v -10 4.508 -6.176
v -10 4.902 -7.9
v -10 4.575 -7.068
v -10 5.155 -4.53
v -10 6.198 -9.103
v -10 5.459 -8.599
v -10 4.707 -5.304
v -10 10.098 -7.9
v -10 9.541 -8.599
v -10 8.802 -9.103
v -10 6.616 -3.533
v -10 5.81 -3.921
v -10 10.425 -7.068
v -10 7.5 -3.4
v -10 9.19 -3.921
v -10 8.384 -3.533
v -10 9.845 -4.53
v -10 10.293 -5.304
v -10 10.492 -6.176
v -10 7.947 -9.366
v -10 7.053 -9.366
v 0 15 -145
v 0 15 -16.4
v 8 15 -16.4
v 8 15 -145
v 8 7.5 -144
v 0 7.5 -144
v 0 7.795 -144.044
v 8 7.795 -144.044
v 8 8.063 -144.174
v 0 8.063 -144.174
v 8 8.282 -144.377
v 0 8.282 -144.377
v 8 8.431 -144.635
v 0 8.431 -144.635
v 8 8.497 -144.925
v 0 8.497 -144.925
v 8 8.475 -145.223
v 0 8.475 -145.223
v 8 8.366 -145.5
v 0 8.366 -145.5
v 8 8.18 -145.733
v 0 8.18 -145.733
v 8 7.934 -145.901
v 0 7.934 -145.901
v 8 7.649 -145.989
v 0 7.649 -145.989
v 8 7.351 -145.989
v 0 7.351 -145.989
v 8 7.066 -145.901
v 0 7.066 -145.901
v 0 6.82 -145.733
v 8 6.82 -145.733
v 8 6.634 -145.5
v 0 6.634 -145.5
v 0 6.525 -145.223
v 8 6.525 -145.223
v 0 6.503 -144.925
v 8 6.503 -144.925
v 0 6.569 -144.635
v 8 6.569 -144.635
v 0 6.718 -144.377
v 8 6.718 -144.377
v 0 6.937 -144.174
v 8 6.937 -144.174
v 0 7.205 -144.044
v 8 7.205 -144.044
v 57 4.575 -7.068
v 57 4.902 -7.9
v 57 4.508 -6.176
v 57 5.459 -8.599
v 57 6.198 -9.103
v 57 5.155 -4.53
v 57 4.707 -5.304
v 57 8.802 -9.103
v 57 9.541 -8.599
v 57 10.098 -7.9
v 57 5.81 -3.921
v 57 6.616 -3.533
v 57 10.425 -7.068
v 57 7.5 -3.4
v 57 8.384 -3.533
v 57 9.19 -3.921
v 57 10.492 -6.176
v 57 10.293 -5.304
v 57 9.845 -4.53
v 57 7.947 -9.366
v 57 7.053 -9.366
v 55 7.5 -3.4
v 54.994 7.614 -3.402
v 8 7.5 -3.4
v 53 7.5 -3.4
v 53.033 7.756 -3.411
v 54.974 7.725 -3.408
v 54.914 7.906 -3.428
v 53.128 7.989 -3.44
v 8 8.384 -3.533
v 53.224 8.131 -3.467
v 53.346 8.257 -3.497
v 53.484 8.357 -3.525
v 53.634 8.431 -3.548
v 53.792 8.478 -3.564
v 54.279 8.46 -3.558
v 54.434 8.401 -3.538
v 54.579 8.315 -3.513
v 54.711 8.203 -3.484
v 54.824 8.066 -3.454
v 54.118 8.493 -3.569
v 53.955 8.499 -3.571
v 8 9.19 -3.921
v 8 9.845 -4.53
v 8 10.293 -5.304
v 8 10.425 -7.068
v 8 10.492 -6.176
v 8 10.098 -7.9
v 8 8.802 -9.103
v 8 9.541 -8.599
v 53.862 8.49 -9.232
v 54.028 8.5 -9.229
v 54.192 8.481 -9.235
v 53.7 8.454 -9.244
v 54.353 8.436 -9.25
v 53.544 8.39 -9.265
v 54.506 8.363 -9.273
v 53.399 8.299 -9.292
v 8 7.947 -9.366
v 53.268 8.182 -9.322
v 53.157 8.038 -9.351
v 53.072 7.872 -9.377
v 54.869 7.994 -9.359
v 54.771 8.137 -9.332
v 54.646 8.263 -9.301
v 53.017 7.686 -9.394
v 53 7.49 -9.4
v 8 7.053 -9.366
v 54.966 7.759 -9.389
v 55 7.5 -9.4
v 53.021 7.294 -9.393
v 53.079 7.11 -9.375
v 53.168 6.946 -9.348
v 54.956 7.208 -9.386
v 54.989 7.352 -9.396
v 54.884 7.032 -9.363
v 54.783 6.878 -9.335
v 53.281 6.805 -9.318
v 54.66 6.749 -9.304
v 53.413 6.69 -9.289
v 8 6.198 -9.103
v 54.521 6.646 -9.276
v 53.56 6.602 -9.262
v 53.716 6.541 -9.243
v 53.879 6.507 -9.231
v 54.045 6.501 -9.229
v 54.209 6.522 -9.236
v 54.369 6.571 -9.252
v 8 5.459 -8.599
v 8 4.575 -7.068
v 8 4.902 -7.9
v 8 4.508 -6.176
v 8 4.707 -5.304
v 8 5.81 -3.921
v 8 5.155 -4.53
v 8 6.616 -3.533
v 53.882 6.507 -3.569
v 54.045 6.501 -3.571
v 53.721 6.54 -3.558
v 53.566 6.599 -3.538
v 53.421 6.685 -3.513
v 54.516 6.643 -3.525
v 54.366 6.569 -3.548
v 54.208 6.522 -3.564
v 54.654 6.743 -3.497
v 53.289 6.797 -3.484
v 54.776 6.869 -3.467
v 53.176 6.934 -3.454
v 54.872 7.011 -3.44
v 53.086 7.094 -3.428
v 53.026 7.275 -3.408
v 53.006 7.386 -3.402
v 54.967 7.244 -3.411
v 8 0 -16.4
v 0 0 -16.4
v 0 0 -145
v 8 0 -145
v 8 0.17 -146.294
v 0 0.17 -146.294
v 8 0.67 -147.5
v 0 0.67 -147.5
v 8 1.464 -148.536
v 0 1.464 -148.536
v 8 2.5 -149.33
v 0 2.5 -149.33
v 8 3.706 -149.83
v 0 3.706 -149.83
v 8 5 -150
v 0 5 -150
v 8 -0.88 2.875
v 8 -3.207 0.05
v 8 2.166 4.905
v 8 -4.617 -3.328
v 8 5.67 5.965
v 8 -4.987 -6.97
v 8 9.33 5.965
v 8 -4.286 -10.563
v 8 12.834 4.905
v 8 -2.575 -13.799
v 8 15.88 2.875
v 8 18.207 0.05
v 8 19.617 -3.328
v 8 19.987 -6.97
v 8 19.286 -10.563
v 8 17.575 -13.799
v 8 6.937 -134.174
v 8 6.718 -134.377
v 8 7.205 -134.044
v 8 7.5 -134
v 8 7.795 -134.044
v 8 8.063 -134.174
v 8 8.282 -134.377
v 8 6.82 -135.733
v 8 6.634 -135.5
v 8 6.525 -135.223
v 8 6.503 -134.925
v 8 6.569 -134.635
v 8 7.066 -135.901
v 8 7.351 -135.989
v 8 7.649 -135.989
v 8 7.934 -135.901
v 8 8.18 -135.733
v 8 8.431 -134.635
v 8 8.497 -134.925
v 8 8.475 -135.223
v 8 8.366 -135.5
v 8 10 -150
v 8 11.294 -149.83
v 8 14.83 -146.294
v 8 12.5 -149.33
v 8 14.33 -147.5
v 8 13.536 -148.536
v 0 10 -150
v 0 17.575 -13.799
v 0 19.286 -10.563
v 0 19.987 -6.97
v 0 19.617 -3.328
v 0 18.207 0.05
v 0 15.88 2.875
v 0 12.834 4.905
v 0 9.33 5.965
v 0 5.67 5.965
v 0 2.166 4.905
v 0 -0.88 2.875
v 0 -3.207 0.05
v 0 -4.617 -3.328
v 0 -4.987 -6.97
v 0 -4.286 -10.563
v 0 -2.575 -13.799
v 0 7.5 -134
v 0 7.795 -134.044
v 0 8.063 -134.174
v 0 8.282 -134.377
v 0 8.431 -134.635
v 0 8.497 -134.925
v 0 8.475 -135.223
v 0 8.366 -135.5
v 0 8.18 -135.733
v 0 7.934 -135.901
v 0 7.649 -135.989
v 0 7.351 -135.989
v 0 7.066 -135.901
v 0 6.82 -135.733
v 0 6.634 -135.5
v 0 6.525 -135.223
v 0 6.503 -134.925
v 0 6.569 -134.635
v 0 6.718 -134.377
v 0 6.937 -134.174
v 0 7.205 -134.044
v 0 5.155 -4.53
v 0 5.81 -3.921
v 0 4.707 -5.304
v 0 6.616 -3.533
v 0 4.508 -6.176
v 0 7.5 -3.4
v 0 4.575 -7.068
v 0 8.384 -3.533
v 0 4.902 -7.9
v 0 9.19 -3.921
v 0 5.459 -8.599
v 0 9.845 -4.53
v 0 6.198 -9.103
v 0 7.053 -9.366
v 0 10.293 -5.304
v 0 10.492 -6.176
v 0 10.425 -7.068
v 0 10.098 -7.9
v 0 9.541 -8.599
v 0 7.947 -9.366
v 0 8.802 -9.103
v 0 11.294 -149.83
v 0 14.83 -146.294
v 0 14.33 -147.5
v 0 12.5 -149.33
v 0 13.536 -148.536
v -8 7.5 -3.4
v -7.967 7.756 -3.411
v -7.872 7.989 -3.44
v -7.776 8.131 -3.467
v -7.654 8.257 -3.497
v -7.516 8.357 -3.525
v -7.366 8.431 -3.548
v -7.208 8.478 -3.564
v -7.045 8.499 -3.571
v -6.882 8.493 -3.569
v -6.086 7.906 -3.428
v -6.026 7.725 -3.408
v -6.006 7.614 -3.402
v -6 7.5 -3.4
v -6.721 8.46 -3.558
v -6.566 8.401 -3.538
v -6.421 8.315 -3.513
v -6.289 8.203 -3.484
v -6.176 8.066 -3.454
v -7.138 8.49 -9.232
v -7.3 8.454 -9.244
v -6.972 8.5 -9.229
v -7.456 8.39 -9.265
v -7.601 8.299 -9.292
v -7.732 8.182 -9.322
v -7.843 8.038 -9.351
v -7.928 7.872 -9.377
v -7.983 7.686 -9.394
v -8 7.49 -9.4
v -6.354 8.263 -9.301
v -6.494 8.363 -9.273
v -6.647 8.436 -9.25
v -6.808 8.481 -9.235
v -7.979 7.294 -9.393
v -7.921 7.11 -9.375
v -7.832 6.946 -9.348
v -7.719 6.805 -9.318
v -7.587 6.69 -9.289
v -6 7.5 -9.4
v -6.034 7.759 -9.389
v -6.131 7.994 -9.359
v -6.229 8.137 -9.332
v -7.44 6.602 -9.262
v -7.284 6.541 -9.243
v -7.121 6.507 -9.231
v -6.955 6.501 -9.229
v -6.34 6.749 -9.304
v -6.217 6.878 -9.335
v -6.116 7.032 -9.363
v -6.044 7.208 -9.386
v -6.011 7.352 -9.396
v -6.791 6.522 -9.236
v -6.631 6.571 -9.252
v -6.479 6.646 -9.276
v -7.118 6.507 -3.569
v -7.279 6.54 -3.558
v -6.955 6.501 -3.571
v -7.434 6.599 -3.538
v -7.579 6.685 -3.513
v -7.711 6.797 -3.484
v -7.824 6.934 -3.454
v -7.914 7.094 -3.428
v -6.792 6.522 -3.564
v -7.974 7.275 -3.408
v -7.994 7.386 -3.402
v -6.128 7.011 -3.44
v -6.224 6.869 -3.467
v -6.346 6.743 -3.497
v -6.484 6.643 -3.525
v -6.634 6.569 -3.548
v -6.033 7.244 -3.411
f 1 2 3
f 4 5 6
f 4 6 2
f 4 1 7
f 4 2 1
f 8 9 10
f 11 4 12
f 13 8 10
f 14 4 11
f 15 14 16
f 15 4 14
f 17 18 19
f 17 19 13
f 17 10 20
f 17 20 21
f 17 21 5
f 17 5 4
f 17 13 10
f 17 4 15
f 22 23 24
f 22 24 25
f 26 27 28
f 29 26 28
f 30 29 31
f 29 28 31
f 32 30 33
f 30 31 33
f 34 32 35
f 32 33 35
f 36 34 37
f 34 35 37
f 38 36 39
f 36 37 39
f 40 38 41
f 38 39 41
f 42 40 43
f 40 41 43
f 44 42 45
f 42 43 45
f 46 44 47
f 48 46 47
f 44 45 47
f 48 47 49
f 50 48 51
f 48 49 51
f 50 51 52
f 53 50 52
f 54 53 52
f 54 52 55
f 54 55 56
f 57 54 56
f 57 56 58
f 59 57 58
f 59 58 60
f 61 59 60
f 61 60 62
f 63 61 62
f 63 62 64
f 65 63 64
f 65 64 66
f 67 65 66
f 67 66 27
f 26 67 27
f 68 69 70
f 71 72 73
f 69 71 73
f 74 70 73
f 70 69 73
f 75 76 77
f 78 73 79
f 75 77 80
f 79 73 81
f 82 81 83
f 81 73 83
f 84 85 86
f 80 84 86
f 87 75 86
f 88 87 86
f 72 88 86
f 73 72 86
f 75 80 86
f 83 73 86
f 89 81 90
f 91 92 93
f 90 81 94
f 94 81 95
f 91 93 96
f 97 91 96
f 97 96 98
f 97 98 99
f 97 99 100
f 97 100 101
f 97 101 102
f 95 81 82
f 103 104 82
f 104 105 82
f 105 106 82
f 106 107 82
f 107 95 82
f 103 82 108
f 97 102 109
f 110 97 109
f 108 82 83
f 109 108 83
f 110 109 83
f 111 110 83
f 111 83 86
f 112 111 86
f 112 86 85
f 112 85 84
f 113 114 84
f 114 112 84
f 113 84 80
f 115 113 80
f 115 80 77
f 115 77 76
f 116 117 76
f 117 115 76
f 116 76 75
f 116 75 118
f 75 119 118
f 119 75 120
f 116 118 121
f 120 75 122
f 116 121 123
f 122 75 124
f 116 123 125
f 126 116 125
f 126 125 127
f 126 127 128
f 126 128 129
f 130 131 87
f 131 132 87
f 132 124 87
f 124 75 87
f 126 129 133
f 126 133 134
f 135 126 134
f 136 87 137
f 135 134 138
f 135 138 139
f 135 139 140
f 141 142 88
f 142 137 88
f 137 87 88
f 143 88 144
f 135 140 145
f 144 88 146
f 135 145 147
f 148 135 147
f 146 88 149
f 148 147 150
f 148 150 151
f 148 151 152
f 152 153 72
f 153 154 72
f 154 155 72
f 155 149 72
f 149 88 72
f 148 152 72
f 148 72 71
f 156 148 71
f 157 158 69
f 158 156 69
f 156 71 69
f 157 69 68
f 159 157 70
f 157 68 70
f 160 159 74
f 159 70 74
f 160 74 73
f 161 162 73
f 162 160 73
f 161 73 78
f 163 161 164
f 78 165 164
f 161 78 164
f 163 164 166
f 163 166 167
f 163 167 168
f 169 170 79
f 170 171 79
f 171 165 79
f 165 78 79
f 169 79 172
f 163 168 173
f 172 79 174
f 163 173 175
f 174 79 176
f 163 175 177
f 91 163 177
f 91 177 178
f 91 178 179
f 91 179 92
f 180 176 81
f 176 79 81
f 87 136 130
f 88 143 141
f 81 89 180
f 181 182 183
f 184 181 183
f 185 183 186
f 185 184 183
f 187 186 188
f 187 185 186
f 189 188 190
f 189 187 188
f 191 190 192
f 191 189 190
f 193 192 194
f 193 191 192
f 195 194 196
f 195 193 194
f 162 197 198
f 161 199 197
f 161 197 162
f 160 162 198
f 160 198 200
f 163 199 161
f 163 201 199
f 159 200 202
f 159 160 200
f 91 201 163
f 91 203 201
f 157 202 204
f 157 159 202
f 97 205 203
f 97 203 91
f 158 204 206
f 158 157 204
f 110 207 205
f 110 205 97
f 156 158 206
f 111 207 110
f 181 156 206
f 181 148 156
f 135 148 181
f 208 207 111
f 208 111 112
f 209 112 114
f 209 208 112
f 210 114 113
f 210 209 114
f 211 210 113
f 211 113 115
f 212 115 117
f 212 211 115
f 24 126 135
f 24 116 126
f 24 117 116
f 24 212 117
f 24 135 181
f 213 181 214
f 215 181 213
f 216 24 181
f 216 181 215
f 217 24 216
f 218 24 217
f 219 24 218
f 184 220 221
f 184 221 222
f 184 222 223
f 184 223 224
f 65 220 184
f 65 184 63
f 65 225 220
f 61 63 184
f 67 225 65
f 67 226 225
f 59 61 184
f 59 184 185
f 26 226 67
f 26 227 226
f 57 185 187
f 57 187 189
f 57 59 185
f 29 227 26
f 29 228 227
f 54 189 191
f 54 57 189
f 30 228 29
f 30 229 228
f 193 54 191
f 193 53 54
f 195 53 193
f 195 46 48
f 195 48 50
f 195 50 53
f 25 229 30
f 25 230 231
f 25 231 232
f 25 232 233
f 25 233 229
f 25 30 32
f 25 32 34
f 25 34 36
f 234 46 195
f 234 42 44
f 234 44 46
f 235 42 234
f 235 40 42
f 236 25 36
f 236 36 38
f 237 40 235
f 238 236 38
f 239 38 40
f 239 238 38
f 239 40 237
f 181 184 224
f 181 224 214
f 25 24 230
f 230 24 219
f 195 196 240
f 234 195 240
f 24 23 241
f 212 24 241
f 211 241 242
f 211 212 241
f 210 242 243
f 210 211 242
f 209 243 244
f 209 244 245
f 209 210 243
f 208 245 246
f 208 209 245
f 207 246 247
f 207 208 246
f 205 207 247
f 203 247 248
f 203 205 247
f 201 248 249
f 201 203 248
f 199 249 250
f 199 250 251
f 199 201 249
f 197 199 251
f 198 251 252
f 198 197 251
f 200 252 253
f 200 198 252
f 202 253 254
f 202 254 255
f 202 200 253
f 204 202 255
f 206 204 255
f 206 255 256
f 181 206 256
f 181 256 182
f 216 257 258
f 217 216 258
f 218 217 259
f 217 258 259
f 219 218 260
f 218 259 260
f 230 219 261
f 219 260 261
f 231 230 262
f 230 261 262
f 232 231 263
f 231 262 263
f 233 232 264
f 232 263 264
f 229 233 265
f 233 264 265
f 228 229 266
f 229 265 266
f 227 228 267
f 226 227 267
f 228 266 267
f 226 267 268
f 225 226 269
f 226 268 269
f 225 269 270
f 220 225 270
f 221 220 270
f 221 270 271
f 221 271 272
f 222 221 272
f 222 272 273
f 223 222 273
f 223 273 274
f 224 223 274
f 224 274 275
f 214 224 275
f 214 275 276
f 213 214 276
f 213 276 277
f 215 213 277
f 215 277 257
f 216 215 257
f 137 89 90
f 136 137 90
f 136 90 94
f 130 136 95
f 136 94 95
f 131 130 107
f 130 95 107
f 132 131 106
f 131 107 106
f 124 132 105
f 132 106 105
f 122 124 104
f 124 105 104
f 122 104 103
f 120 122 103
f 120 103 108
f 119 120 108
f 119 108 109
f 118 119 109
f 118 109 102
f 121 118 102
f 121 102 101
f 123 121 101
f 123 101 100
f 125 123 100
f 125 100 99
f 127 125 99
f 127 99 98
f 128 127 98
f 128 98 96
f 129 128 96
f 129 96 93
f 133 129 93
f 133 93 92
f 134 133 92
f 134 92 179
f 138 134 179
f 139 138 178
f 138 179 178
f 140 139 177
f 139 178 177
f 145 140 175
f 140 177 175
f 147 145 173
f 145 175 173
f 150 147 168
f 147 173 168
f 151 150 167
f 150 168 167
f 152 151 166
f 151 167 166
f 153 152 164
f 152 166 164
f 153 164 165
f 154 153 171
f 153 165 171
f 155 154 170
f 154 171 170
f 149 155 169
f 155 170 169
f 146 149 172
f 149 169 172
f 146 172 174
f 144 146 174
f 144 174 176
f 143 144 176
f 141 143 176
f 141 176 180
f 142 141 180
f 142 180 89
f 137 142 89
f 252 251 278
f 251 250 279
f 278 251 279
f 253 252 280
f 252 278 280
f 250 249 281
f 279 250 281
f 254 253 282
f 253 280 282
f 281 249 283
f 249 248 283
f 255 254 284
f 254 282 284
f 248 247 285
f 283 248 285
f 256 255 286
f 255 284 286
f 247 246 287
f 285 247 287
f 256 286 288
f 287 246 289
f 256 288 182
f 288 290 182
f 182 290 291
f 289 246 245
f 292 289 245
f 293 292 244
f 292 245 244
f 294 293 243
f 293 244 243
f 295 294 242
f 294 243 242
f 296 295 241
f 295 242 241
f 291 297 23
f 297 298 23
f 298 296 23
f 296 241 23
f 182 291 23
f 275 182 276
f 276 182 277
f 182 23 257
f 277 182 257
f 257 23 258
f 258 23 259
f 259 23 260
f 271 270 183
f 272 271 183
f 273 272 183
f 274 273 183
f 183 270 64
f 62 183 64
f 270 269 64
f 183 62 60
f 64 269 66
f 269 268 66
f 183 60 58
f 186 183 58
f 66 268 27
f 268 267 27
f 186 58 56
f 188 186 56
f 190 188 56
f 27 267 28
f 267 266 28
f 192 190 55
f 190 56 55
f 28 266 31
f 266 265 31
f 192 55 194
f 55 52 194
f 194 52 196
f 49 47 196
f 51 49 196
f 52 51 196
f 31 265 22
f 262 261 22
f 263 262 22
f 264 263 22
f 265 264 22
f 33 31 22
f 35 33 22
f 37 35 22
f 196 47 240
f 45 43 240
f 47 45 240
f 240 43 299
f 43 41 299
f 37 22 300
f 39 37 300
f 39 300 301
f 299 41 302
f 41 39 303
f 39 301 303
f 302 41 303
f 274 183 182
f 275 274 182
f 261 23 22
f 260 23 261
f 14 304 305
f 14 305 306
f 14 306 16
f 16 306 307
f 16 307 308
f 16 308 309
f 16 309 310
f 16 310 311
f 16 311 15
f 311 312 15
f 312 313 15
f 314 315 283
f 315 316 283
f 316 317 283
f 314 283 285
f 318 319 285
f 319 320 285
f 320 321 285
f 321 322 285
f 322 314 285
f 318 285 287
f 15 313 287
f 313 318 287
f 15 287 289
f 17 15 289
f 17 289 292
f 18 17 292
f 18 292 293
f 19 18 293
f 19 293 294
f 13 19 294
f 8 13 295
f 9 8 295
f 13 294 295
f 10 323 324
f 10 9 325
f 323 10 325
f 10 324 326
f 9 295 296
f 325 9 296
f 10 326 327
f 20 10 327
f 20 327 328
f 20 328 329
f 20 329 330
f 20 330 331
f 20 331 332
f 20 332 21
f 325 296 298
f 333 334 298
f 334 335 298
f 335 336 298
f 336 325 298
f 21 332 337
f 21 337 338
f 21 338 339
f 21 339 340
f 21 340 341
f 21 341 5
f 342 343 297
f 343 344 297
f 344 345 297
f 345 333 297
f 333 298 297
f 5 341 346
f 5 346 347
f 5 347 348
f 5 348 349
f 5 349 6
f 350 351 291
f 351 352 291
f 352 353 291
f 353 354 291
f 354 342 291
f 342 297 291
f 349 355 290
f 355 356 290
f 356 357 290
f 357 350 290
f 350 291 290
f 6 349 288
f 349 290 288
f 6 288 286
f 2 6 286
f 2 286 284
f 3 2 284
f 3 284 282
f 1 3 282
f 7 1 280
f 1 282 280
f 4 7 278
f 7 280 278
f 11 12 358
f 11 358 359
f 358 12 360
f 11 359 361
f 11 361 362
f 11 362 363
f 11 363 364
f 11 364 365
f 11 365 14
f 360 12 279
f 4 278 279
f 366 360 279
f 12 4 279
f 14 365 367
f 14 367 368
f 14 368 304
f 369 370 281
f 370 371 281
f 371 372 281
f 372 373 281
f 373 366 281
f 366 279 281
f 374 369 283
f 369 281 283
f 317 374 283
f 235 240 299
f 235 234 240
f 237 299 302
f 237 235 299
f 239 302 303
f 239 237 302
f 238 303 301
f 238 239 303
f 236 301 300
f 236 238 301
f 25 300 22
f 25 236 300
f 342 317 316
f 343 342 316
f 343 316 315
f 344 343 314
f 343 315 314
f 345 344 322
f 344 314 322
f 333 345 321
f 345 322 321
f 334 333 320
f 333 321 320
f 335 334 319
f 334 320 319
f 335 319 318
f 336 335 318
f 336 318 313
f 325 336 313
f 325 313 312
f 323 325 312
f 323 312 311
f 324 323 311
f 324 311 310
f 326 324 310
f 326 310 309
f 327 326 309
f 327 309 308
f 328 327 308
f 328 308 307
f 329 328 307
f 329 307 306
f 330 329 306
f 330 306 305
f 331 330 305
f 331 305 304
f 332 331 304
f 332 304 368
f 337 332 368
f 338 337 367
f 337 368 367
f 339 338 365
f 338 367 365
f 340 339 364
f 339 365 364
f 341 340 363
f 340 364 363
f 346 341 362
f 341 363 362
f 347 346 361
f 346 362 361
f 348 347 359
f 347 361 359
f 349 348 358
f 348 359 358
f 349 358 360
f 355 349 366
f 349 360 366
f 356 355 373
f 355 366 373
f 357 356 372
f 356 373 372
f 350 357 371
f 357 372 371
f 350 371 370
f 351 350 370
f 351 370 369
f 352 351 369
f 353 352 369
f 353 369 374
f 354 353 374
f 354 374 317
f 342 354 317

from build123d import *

# Parameters (mm, degrees)
SKETCH_1_W           = 150
SKETCH_1_H           = 15
EXTRUDE_1_DEPTH      = 8
FILLET_1_R           = 5
SKETCH_6_R           = 12.5
EXTRUDE_2_DEPTH      = 8
SKETCH_11_R          = 1
CUT_EXTRUDE_8_DEPTH  = 10
EXTRUDE_5_DEPTH      = 10
EXTRUDE_5_DEPTH_BACK = 57
SKETCH_15_R          = 3
CUT_EXTRUDE_9_REACH  = 163.707
SKETCH_16_R          = 1


with BuildPart() as part:
    # 草图1 → 凸台-拉伸1 (new body)
    with BuildSketch(Plane(origin=(0, 0, 0), x_dir=(0, 0, -1), z_dir=(1, 0, 0))):
        with Locations((75, 7.5)):
            Rectangle(SKETCH_1_W, SKETCH_1_H)
    extrude(amount=EXTRUDE_1_DEPTH)

    # 圆角1
    fillet_1_edges = [part.edges().sort_by_distance(p)[0] for p in [
        (4, 15, 0),
        (4, 15, -150),
        (4, 0, -150),
        (4, 0, 0),
    ]]
    fillet(fillet_1_edges, radius=FILLET_1_R)

    # 草图6 → 凸台-拉伸2 (add)
    with BuildSketch(Plane(origin=(8, 0, 0), x_dir=(0, 0, -1), z_dir=(1, 0, 0))):
        with Locations((6.4, 7.5)):
            Circle(SKETCH_6_R)
    extrude(amount=-EXTRUDE_2_DEPTH)

    # 草图11 → 切除-拉伸8 (cut)
    with BuildSketch(Plane.ZY):
        with Locations((-145, 7.5)):
            Circle(SKETCH_11_R)
        with Locations((-135, 7.5)):
            Circle(SKETCH_11_R)
        with Locations((85, 7.5)):
            Circle(SKETCH_11_R)
        with Locations((95, 7.5)):
            Circle(SKETCH_11_R)
    extrude(amount=-CUT_EXTRUDE_8_DEPTH, mode=Mode.SUBTRACT)

    # 草图15 → 凸台-拉伸5 (add, two sides: drawn at the far end of the back side and taken through both)
    with BuildSketch(Plane.ZY.offset(-EXTRUDE_5_DEPTH_BACK)):
        with Locations((-6.4, 7.5)):
            Circle(SKETCH_15_R)
    extrude(amount=EXTRUDE_5_DEPTH + EXTRUDE_5_DEPTH_BACK)

    # 草图16 → 切除-拉伸9 (cut, up to next)
    with BuildSketch(Plane.XY, mode=Mode.PRIVATE) as cut_extrude_9_sk1:
        with Locations((-7, 7.5)):
            Circle(SKETCH_16_R)
    cut_extrude_9_tool1 = extrude(cut_extrude_9_sk1.sketch, amount=-CUT_EXTRUDE_9_REACH, mode=Mode.PRIVATE) & part.part
    # 草图16 → 切除-拉伸9 (cut, up to next)
    with BuildSketch(Plane.XY, mode=Mode.PRIVATE) as cut_extrude_9_sk2:
        with Locations((54, 7.5)):
            Circle(SKETCH_16_R)
    cut_extrude_9_tool2 = extrude(cut_extrude_9_sk2.sketch, amount=-CUT_EXTRUDE_9_REACH, mode=Mode.PRIVATE) & part.part
    add(cut_extrude_9_tool1.solids().sort_by_distance((-7, 7.5, 0))[0], mode=Mode.SUBTRACT)
    add(cut_extrude_9_tool2.solids().sort_by_distance((54, 7.5, 0))[0], mode=Mode.SUBTRACT)


solid = part.part
